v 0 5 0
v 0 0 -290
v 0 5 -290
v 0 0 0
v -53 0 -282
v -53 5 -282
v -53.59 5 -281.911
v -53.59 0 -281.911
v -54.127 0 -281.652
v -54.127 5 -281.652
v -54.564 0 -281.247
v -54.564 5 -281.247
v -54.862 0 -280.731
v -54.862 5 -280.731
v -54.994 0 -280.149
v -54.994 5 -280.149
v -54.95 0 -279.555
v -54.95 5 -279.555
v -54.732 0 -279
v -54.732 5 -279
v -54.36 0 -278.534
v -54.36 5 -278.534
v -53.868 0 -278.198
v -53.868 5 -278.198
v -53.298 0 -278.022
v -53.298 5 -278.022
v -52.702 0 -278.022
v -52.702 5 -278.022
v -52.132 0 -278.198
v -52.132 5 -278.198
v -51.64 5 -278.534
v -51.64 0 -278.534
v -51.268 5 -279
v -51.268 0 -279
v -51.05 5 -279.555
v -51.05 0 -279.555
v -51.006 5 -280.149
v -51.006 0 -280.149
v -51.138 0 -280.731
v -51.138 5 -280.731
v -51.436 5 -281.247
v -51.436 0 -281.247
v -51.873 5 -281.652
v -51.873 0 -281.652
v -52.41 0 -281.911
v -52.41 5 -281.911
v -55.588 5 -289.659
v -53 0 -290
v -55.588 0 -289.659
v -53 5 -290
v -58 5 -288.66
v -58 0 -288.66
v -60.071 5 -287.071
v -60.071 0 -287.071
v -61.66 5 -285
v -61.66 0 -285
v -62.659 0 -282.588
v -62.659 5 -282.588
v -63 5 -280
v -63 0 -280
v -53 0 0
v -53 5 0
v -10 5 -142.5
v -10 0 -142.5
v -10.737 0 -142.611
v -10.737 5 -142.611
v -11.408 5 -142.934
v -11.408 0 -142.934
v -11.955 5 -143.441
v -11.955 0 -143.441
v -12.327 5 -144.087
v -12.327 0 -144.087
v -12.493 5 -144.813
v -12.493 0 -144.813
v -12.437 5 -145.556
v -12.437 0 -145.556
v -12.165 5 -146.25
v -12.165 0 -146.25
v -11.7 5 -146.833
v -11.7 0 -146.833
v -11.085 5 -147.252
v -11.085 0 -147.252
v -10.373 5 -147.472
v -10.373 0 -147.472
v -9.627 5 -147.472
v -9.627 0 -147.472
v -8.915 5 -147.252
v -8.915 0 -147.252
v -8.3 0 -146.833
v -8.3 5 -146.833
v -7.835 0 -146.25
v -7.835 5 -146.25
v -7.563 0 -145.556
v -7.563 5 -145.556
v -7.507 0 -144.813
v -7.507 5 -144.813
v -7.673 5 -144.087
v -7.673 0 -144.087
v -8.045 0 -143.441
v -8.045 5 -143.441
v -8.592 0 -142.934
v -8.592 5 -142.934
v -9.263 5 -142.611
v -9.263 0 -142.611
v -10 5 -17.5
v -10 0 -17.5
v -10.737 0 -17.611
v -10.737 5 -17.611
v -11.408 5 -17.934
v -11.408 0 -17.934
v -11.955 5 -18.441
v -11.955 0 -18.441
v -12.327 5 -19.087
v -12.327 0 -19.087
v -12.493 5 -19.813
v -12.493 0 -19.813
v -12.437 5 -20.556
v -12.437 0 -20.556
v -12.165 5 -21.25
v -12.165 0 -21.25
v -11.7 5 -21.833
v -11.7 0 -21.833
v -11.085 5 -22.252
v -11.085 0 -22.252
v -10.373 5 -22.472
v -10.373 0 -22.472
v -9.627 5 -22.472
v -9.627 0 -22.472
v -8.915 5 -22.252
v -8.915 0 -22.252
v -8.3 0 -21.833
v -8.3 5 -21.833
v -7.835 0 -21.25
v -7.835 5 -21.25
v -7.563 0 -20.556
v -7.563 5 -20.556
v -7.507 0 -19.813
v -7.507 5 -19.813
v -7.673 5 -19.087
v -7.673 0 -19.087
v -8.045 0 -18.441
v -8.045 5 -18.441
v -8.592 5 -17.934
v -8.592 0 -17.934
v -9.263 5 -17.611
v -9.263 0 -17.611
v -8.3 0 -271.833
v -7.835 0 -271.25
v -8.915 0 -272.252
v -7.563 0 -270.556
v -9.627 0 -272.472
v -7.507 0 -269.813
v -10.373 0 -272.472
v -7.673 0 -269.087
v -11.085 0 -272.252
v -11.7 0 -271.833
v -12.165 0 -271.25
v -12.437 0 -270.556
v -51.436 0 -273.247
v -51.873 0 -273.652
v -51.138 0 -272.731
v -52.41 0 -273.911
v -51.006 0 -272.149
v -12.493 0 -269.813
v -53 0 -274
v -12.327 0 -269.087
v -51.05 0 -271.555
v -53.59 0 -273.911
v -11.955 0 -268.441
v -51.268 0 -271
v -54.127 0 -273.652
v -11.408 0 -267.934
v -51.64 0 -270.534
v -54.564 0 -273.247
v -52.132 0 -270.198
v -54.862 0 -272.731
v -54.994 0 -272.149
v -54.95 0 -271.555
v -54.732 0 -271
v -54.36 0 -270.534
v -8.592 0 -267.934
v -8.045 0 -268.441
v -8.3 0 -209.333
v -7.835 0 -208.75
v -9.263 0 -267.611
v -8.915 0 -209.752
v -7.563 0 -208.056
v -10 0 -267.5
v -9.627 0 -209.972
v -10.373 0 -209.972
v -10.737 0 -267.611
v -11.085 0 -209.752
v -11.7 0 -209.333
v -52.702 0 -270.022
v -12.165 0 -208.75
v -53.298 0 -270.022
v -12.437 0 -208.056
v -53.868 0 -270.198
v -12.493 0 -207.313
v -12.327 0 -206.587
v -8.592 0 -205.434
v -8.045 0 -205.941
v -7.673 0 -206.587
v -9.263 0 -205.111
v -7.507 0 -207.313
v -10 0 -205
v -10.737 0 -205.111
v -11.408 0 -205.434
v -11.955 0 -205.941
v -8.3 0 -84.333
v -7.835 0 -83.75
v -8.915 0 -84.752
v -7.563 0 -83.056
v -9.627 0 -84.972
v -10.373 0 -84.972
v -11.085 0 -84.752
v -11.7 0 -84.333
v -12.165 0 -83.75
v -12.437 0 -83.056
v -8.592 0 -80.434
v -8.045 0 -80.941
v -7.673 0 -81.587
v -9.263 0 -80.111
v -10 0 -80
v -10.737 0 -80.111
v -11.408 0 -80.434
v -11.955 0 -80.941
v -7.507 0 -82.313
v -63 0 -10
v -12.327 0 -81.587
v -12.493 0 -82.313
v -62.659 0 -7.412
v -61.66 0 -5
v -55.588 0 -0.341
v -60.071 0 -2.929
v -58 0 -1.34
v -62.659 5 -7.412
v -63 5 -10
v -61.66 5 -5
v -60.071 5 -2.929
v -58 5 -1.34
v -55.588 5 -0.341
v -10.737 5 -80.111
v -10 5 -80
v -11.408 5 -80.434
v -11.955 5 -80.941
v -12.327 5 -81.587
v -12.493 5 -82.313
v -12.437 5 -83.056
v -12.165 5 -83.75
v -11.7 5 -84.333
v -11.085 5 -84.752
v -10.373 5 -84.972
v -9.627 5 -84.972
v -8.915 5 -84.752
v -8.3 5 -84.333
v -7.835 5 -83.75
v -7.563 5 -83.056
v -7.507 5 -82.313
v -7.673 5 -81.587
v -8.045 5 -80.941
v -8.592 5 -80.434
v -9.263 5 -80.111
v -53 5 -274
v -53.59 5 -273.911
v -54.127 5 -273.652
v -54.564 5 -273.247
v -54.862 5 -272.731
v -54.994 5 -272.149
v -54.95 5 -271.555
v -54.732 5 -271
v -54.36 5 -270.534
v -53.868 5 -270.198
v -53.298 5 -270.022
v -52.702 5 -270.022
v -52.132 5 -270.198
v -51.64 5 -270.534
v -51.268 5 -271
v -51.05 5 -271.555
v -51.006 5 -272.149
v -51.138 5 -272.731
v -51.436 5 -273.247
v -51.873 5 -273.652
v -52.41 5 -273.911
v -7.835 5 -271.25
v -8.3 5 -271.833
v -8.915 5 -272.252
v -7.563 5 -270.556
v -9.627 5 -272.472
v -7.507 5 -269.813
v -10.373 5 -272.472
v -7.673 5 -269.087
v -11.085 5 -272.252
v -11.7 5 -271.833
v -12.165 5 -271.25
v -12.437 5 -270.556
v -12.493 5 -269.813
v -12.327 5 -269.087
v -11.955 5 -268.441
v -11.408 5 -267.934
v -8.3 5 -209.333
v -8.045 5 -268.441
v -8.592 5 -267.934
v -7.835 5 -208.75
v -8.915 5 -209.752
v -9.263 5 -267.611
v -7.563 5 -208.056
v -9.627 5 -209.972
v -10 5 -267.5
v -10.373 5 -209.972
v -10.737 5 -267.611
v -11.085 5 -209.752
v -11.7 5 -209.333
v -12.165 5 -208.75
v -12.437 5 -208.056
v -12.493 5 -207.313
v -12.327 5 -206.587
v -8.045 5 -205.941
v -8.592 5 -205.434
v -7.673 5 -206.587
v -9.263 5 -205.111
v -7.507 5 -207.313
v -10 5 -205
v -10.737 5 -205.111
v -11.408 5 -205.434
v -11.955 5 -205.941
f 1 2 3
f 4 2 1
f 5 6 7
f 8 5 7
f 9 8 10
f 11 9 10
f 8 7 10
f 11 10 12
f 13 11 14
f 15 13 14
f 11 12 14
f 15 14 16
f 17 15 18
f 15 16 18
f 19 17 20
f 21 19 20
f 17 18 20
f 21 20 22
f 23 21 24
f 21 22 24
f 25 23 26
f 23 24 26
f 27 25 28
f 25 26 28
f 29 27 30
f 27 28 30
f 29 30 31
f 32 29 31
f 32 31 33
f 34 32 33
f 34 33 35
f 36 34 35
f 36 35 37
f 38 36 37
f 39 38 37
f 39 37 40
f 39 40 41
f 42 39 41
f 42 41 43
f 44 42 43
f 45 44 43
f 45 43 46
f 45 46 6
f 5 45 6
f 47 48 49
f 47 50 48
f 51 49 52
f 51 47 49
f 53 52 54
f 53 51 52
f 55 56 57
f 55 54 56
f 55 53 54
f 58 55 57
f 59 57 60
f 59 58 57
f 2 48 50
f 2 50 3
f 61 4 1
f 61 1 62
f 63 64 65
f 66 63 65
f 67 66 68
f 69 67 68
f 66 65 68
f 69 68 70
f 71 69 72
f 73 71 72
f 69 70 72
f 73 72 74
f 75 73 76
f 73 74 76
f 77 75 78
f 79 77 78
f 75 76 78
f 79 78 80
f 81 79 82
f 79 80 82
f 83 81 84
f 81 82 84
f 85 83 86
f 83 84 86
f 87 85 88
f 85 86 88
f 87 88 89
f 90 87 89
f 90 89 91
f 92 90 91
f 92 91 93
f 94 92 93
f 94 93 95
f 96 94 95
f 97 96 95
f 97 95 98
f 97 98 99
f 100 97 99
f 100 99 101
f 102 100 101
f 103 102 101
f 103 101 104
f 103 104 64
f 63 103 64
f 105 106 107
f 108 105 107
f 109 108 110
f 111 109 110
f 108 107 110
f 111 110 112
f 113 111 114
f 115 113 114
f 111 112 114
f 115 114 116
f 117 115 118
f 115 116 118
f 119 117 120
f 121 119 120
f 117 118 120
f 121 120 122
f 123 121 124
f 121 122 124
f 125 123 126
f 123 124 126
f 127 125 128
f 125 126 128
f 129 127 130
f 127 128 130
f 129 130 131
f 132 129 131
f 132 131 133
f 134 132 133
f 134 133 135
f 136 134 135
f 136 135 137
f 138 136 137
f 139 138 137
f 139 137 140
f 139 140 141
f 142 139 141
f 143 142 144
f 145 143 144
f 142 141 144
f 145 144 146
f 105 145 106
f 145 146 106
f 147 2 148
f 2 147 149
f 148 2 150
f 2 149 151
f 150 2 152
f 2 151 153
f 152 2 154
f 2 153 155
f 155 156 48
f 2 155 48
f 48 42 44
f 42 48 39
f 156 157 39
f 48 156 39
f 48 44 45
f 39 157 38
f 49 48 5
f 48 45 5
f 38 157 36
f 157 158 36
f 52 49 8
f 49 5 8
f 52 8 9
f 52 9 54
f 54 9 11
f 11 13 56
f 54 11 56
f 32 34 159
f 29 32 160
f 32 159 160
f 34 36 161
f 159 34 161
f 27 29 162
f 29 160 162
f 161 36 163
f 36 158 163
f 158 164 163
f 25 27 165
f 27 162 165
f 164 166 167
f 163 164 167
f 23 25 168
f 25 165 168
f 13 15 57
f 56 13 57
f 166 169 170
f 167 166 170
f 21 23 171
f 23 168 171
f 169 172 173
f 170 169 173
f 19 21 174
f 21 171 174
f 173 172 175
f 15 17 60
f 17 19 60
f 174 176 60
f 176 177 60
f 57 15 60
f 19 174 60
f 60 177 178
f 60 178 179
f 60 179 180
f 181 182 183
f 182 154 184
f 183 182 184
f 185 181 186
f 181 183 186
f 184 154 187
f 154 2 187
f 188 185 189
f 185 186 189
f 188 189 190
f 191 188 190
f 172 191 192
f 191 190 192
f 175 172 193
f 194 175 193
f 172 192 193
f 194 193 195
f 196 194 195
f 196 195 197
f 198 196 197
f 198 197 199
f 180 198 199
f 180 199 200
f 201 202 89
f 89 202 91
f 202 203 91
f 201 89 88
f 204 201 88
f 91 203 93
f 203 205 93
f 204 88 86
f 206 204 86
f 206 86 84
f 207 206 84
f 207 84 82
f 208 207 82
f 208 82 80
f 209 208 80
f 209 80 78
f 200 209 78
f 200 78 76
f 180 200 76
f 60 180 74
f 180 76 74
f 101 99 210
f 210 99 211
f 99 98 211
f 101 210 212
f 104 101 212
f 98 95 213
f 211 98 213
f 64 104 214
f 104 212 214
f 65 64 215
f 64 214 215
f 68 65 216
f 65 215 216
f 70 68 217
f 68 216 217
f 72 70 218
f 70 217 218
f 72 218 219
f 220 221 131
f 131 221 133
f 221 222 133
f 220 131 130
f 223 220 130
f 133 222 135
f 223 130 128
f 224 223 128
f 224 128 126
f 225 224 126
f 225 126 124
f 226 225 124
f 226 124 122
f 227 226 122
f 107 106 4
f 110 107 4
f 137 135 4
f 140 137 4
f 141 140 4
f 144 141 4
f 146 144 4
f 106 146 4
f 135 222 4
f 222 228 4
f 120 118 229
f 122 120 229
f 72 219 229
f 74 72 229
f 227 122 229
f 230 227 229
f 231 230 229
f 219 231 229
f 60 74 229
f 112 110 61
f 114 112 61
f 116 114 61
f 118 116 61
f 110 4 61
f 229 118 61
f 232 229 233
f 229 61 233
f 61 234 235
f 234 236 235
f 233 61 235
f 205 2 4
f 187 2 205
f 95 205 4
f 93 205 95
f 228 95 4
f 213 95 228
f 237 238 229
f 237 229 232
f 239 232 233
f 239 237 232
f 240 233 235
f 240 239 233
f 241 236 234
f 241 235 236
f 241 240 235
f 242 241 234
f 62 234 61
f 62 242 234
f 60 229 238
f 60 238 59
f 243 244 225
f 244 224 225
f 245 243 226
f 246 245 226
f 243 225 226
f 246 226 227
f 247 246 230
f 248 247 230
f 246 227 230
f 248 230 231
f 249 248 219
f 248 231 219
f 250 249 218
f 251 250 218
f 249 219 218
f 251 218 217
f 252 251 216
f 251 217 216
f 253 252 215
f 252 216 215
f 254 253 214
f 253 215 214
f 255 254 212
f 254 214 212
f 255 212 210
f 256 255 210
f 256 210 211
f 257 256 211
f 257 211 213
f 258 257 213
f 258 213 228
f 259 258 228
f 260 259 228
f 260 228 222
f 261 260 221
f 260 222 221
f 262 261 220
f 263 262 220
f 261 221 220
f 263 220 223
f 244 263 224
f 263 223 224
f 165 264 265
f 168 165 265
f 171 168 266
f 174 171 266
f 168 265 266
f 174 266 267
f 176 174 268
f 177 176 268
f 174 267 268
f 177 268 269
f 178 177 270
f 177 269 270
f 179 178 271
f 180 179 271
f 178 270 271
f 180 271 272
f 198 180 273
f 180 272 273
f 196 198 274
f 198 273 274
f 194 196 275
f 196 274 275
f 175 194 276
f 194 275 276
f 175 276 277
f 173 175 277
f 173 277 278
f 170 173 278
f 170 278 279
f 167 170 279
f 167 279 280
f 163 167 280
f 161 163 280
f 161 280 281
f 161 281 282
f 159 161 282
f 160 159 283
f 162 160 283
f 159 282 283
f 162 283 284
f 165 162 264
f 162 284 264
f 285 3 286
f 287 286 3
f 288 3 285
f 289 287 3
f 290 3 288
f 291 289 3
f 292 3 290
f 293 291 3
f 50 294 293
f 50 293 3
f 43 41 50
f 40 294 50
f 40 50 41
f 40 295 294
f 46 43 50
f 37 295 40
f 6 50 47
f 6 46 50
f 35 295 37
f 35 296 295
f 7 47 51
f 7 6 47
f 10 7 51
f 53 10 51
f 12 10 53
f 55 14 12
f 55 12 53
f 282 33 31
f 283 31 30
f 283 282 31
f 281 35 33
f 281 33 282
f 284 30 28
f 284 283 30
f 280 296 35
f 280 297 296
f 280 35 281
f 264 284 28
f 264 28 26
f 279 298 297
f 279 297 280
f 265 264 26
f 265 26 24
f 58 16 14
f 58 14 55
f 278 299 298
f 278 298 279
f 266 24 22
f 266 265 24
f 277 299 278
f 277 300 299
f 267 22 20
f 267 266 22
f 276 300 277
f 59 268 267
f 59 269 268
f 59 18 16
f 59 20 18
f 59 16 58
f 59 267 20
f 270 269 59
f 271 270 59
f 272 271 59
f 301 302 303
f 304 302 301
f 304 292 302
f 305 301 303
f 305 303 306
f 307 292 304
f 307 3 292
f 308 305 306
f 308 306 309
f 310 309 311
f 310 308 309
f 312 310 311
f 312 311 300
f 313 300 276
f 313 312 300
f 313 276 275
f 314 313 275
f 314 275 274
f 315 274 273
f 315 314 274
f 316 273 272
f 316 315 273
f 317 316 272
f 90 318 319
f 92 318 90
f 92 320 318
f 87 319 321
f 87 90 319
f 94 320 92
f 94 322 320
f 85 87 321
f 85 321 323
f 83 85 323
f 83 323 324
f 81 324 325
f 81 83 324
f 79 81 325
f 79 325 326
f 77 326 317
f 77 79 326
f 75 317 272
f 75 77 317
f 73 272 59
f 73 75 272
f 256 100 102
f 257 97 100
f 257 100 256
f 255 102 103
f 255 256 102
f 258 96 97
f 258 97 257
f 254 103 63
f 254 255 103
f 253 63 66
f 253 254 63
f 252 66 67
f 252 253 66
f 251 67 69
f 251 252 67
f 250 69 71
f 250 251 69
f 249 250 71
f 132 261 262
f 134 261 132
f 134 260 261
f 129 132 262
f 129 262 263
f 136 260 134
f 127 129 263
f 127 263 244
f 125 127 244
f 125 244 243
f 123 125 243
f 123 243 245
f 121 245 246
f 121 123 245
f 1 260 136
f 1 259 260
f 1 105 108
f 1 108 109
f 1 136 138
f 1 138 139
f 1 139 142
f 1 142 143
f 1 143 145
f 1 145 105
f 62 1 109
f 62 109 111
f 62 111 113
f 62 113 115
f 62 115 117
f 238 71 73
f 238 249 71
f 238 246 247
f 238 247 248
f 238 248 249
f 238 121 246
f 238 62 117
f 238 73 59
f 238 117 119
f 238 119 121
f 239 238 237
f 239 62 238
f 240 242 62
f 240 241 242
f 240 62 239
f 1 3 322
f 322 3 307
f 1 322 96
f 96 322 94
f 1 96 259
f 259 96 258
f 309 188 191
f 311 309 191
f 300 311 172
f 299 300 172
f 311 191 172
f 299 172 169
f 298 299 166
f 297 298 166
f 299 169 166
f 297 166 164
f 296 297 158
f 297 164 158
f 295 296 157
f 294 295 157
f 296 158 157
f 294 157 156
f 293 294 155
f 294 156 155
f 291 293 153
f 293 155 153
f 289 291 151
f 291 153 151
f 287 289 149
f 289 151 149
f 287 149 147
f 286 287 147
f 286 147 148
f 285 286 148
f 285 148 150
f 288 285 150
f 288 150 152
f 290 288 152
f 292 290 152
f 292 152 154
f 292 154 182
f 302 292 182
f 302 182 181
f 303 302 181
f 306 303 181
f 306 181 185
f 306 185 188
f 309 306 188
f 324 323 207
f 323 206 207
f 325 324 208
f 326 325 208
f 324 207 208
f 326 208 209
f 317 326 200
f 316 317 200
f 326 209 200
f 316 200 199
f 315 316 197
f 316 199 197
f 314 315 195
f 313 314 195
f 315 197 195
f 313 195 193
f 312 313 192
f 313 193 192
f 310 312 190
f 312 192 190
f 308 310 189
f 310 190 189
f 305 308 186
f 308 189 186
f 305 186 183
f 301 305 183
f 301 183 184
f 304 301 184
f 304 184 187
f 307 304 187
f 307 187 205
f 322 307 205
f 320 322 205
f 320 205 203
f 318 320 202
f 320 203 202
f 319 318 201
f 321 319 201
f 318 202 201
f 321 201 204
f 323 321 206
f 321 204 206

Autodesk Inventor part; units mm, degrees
ref_plane "YZ Plane" through (0, 0, 0) normal (1, 0, 0) x (0, 1, 0)
ref_plane "XZ Plane" through (0, 0, 0) normal (0, 1, 0) x (-1, 0, 0)
ref_plane "XY Plane" through (0, 0, 0) normal (0, 0, 1) x (1, 0, 0)
sketch "Sketch1" plane through (0, 0, 0) normal (0, 1, 0) x (-1, 0, 0)
  line L0 (0, 0) -> (63, 0)
  line L1 (63, 0) -> (63, -290)
  line L2 (63, -290) -> (0, -290)
  line L3 (0, -290) -> (0, 0)
  dimension "d0" = 290
  dimension "d1" = 63
extrude "Extrusion1" add sketch "Sketch1" along normal blind 5
fillet "Fillet1" radius 10 2 edges at (-63, 2.5, 0) (-63, 2.5, -290)
sketch "Sketch2" plane through (0, 0, 0) normal (0, -1, 0) x (1, 0, 0)
  line L0 (-53, -251.9925) -> (-53, -308.0075) construction
  line L1 (-63, -280) -> (-63, -10) projected
  circle A0 centre (-53, -280) radius 2
  circle A1 centre (-53, -272) radius 2
  line L2 (0, -290) -> (-53, -290) projected
  point P0 (0, 0)
  dimension "d5" = 10
  dimension "d6" = 4
  dimension "d7" = 4
  dimension "d8" = 8
  dimension "d9" = 10
hole "Hole1" at (-53, 0, -280) at (-53, 0, -272) direction (0, 1, 0) diameter 4 end through all
sketch "Sketch3" plane through (0, 5, 0) normal (0, 1, 0) x (1, 0, 0)
  line L0 (-10, -16.5573) -> (-10, 317.2677) construction
  line L1 (0, 0) -> (0, 290) projected
  circle A0 centre (-10, 20) radius 2.5
  circle A1 centre (-10, 270) radius 2.5
  circle A2 centre (-10, 82.5) radius 2.5
  circle A3 centre (-10, 145) radius 2.5
  line L2 (-53, 0) -> (0, 0) projected
  line L3 (0, 290) -> (-53, 290) projected
  circle A4 centre (-10, 207.5) radius 2.5
  dimension "d17" = 10
  dimension "d18" = 20
  dimension "d19" = 20
  dimension "d20" = 62.5
  dimension "d21" = 62.5
  dimension "d22" = 62.5
  dimension "d23" = 5
  dimension "d24" = 5
  dimension "d25" = 5
  dimension "d26" = 5
  dimension "d27" = 5
hole "Hole2" at (-10, 5, -20) at (-10, 5, -82.5) at (-10, 5, -145) at (-10, 5, -207.5) at (-10, 5, -270) direction (0, -1, 0) diameter 5 end through all
equation "\"d7\" = d6"
equation "\"d10\" = d6"
equation "\"d24\" = d23"
equation "\"d25\" = d24"
equation "\"d26\" = d25"
equation "\"d27\" = d26"
equation "\"d28\" = d23"
properties part number "Y_Kettenhalter"
